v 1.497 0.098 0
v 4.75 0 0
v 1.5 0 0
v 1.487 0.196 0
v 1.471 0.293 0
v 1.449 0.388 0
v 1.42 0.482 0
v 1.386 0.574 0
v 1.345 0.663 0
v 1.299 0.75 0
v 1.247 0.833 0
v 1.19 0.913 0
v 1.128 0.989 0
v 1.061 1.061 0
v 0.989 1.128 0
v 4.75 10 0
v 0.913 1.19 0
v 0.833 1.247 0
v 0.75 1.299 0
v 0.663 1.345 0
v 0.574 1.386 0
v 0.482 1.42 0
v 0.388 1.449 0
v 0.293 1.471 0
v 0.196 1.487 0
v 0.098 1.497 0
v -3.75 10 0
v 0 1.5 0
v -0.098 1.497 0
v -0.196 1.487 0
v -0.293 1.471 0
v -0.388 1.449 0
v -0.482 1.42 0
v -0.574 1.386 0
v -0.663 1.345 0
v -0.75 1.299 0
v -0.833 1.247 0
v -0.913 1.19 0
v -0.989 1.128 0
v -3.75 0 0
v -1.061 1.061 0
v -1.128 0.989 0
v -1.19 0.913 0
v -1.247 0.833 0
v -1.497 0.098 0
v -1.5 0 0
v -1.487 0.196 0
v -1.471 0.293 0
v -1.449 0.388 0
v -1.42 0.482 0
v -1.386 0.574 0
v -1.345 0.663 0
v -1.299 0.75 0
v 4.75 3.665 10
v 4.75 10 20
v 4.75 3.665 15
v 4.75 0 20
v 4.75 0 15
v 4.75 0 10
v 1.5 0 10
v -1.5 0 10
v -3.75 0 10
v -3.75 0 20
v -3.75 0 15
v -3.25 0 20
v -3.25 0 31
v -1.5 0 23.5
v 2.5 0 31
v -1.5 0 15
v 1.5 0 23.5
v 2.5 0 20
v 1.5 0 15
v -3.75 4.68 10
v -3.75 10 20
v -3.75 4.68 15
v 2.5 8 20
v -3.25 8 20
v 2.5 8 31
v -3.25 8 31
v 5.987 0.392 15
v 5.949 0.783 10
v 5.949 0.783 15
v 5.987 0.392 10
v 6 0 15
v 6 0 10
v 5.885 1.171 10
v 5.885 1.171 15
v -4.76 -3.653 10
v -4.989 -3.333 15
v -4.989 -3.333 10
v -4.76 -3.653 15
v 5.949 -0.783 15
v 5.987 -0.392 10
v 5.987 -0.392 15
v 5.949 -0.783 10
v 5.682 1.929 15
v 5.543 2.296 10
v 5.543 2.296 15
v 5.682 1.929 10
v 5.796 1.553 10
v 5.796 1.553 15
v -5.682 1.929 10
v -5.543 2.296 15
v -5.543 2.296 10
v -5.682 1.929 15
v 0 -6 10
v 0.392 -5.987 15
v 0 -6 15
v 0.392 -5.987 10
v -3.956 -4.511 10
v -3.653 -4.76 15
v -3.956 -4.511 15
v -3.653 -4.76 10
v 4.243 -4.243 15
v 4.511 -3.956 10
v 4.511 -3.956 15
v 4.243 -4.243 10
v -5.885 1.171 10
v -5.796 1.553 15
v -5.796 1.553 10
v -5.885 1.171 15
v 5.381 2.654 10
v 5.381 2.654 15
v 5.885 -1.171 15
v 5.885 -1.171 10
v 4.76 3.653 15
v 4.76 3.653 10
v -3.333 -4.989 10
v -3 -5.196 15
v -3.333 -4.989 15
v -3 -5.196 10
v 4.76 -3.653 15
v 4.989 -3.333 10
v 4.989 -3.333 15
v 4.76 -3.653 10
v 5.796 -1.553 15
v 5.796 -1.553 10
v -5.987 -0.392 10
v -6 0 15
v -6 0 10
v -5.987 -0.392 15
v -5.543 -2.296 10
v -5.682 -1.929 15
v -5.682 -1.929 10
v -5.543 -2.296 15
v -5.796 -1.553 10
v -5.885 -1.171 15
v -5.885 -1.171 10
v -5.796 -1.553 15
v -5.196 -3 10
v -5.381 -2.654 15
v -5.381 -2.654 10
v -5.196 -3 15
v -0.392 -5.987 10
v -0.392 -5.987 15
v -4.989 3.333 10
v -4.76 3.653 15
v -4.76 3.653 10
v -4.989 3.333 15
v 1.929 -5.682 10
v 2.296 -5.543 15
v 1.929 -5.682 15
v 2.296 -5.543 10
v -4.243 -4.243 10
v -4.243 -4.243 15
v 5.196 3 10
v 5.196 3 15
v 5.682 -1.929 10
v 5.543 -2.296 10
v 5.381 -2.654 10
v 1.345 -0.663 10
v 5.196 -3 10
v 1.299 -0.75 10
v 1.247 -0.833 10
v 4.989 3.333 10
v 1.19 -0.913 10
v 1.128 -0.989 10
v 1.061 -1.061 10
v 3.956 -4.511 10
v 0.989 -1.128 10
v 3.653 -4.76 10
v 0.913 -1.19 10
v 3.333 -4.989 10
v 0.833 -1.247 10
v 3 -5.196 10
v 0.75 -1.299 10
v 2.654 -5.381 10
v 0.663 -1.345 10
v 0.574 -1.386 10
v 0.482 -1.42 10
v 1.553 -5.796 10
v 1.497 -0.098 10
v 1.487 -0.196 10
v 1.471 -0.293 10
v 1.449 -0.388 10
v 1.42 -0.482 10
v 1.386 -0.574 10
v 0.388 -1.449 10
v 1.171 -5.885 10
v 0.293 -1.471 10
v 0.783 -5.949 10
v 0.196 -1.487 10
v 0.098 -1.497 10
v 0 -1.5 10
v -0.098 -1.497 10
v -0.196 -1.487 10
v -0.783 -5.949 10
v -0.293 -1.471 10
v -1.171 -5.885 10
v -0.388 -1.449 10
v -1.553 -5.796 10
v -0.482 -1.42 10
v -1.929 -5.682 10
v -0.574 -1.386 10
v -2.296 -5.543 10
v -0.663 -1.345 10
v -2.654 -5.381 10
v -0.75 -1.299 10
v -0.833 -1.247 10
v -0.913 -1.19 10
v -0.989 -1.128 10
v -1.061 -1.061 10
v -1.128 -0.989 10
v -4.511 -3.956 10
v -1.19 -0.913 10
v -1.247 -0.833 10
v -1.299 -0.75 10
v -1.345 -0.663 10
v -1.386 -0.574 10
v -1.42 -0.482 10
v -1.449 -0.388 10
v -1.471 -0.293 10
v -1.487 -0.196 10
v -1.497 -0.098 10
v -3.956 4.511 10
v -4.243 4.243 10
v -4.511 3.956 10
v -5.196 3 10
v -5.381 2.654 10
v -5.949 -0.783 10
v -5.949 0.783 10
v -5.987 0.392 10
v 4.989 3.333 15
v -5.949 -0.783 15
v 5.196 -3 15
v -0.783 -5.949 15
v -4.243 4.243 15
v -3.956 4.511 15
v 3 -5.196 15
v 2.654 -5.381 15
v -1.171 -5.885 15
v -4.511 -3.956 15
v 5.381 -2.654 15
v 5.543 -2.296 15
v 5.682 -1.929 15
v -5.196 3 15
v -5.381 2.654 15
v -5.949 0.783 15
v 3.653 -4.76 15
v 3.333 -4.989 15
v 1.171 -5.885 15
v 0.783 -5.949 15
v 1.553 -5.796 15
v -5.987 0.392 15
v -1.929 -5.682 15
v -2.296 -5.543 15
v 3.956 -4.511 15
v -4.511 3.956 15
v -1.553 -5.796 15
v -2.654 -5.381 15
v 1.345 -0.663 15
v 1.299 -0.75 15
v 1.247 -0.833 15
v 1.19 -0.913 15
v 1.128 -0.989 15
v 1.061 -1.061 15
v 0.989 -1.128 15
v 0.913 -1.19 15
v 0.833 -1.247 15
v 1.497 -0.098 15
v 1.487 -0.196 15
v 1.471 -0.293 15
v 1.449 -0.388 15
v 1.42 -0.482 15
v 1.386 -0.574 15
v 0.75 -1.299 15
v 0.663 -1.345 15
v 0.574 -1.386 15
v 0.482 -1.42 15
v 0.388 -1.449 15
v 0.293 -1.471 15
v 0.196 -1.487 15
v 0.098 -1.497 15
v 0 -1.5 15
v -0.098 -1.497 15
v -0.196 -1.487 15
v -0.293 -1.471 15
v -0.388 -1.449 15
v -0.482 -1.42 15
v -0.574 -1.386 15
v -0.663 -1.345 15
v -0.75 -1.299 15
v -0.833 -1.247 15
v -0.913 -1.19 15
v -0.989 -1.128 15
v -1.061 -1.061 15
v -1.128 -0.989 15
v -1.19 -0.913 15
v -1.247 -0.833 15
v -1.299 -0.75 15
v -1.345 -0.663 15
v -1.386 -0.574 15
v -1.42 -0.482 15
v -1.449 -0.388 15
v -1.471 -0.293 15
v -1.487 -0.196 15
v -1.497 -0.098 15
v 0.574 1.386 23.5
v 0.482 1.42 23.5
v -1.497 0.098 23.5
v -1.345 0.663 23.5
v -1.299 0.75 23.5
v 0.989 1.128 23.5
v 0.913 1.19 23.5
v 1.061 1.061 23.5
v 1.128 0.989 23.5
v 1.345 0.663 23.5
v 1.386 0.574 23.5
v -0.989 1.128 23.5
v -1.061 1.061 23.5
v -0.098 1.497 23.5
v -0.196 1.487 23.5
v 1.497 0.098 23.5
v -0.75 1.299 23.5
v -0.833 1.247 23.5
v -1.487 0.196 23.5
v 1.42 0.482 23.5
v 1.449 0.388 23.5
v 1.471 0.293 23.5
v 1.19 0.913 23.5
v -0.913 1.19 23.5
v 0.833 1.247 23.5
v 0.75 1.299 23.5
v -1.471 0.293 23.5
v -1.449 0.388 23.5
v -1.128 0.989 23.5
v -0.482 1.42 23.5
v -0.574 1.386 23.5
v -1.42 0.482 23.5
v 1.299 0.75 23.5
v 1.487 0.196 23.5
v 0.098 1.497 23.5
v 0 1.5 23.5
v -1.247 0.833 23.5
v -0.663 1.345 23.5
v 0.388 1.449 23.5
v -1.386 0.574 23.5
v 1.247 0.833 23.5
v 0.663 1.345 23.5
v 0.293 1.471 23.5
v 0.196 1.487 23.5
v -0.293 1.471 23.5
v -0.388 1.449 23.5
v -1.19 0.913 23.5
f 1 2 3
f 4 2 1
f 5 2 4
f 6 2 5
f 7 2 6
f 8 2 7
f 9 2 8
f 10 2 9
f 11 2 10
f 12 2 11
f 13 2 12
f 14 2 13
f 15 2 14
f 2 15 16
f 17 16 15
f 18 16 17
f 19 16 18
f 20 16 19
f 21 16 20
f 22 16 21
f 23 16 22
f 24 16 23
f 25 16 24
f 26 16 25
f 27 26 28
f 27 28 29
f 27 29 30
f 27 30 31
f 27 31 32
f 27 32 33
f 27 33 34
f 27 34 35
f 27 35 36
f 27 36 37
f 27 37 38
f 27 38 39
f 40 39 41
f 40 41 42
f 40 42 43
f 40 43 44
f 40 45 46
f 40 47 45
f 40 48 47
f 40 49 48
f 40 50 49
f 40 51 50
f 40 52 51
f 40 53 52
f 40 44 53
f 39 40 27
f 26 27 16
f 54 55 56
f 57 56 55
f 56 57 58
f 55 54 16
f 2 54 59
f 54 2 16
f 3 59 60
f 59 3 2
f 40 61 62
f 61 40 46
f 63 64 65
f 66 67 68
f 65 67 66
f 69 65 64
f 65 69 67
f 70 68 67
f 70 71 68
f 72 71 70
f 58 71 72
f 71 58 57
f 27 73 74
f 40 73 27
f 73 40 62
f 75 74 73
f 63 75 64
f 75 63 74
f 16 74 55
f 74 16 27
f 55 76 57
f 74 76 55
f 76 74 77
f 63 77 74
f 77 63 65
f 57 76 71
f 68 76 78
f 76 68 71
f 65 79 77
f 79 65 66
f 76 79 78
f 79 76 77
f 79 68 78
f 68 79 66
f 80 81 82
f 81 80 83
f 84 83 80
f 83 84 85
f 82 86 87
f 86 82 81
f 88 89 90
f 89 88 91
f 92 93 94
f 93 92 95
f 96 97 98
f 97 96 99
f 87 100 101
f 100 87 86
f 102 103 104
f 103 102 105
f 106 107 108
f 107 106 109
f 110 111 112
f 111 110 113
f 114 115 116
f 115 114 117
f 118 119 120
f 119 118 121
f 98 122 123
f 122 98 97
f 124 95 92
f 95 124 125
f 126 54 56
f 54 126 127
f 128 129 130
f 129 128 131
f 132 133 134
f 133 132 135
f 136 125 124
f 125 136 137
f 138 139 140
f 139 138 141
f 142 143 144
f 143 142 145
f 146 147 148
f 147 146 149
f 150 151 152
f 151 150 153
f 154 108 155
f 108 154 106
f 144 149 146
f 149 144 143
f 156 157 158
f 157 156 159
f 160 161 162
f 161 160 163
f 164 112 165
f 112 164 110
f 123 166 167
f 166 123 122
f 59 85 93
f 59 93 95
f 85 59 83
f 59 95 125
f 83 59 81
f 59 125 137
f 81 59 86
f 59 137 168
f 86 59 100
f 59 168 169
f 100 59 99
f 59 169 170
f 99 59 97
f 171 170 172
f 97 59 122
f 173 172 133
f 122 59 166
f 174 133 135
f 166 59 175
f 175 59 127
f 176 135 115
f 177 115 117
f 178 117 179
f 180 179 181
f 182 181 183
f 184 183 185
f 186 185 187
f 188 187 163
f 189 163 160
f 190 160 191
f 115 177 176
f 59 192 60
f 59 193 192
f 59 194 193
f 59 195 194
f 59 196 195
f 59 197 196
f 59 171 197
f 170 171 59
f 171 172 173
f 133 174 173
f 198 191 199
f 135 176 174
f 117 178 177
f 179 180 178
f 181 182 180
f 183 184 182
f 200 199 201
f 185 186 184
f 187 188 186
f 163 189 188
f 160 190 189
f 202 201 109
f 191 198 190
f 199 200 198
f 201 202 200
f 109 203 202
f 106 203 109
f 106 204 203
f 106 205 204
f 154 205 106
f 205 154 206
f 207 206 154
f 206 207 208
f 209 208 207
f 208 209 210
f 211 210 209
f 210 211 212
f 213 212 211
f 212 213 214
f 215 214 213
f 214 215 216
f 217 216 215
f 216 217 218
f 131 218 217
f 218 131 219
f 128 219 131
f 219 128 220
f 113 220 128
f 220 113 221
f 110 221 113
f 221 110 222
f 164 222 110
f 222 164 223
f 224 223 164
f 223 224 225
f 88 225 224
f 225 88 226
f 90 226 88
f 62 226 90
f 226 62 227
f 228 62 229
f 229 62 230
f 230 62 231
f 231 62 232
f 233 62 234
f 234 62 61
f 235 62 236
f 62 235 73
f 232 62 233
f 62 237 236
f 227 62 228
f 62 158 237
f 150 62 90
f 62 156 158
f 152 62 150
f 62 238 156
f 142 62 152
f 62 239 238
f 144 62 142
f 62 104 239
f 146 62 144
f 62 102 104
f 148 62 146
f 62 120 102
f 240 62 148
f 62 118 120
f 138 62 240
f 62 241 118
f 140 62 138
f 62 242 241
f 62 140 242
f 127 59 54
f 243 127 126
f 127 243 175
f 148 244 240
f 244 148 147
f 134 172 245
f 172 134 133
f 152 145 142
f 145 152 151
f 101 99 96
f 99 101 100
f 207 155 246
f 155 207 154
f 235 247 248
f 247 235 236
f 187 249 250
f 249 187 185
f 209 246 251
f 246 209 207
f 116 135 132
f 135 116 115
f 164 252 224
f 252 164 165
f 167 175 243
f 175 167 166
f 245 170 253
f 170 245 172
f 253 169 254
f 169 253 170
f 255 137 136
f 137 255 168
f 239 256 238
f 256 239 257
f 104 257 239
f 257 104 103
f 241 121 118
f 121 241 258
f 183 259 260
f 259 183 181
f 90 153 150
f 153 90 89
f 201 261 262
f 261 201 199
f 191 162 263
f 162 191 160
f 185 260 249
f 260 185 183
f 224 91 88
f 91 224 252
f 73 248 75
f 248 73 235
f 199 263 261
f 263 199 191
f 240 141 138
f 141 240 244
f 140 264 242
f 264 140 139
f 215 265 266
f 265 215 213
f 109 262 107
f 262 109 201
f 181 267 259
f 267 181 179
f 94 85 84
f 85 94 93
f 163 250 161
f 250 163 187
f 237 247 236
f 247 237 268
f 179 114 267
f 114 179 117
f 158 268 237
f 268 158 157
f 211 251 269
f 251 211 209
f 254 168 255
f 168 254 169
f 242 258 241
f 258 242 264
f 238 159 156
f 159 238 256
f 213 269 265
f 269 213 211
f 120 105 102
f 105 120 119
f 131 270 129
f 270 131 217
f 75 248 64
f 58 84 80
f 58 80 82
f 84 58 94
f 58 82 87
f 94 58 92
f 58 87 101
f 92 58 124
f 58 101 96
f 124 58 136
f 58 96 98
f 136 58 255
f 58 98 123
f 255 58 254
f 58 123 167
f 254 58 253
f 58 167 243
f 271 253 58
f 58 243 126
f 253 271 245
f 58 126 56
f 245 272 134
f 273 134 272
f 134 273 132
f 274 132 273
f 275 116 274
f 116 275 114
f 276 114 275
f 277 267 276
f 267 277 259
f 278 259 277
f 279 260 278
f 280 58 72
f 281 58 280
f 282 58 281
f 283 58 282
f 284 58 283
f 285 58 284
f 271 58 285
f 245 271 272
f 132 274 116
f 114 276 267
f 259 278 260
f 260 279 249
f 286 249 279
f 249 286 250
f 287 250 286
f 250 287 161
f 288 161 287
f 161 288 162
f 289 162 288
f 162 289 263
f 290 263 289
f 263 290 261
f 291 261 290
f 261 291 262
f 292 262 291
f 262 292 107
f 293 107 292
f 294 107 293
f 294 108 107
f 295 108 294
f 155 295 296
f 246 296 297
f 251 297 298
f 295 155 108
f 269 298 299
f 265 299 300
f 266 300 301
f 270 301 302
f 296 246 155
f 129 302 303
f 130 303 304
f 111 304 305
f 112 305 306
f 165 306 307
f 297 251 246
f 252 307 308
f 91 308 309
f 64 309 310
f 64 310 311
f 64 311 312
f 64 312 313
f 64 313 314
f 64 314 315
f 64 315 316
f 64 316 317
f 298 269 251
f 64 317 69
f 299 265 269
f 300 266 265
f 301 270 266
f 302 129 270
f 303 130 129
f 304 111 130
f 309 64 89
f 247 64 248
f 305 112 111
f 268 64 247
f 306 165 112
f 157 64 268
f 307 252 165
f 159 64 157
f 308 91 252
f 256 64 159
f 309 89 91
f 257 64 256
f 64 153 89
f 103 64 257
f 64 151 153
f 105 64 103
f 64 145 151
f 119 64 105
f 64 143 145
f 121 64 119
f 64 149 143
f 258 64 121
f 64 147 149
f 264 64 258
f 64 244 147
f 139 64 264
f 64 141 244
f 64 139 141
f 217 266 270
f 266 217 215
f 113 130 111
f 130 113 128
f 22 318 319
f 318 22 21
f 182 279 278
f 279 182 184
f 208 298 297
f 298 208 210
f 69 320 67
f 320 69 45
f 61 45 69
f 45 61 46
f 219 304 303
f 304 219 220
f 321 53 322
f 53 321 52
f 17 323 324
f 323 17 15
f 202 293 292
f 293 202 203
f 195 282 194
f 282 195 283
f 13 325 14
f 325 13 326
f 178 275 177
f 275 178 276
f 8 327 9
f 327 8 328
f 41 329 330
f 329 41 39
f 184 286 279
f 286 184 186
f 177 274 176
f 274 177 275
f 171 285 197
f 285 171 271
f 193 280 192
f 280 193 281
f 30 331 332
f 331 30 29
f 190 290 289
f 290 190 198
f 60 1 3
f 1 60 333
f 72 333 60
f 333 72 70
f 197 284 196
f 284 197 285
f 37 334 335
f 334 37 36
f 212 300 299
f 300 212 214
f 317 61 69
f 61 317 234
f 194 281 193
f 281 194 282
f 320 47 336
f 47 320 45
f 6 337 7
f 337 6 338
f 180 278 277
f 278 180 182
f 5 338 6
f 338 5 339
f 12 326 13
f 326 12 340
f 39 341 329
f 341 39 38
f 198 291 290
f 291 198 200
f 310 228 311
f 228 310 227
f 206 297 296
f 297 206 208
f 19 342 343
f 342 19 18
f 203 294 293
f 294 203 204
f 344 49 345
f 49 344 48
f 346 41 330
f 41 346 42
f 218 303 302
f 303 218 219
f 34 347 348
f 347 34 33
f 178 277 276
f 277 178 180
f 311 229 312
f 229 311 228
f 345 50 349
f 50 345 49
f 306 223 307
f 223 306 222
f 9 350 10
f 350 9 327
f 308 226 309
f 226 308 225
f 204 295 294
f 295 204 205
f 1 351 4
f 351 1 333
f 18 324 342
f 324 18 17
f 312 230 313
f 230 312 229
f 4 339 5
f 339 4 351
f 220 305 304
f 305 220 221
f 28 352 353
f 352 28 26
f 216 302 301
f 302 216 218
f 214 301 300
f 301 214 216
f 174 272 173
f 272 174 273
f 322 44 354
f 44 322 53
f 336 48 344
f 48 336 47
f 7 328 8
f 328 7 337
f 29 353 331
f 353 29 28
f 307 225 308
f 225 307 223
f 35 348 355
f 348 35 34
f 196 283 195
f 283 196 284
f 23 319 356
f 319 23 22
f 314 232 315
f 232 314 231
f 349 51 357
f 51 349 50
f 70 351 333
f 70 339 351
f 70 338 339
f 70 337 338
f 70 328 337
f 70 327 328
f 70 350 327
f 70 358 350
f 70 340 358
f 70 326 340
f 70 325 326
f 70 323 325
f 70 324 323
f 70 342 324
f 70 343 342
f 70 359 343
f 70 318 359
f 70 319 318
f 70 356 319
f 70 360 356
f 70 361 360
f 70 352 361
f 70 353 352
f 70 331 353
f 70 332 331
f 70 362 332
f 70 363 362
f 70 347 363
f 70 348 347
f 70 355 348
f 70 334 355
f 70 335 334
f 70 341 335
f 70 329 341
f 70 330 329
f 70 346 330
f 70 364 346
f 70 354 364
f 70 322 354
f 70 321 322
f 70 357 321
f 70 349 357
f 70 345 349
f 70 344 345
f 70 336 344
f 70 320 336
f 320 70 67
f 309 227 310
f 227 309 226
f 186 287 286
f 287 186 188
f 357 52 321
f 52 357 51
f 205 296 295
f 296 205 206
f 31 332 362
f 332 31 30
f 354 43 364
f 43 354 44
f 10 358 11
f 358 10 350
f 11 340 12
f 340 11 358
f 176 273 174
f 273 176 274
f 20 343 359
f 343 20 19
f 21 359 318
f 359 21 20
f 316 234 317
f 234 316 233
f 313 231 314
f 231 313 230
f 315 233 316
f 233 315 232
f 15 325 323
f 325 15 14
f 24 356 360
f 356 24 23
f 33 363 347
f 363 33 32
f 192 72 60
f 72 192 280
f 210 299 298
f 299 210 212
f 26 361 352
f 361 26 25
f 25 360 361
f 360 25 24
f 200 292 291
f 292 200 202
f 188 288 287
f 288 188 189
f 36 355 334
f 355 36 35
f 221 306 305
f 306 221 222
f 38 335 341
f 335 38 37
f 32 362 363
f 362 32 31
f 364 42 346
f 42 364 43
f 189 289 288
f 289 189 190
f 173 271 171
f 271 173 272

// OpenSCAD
// Hose-barb reducer: 8 mm tubing -> 5 mm tubing
// Print orientation: standing upright along +Z

$fn = 96;

// ---- Dimensions (mm) ----
tube_d1     = 8;    // first tubing inner diameter
tube_d2     = 5;    // second tubing inner diameter
bore        = 3;    // through-bore diameter
barb_h1     = 10;   // first barb height
barb_od1_b  = 7.5;  // first barb outer diameter at bottom
barb_od1_t  = 9.5;  // first barb outer diameter at top
collar_d    = 12;   // collar diameter
collar_h    = 5;    // collar height
barb_h2     = 8;    // second barb height
barb_od2_b  = 6.5;  // second barb outer diameter at bottom
barb_od2_t  = 5.0;  // second barb outer diameter at top
eps         = 0.5;  // overshoot for clean cuts

total_h = barb_h1 + collar_h + barb_h2;  // 23 mm

// ---- Model ----
difference() {
    union() {
        // First stacked barbs (z = 0 .. 10)
        for (i = [0, 1])
            translate([0, 0, i * barb_h1])
                linear_extrude(height = barb_h1)
                    polygon(points = [
                        [-barb_od1_b / 2, 0],
                        [ barb_od1_t / 2, 0],
                        [ barb_od1_t / 2, barb_h1],
                        [-barb_od1_b / 2, barb_h1]
                    ]);

        // Collar (z = 15 .. 20)
        translate([0, 0, barb_h1 + collar_h - collar_h])
            cylinder(d = collar_d, h = collar_h);

        // Second stacked barbs (z = 25 .. 33)
        for (i = [0, 1])
            translate([0, 0, barb_h1 + collar_h + i * barb_h2])
                linear_extrude(height = barb_h2)
                    polygon(points = [
                        [-barb_od2_b / 2, 0],
                        [ barb_od2_t / 2, 0],
                        [ barb_od2_t / 2, barb_h2],
                        [-barb_od2_b / 2, barb_h2]
                    ]);
    }

    // Through-bore
    translate([0, 0, -eps])
        cylinder(d = bore, h = total_h + 2 * eps);
}
